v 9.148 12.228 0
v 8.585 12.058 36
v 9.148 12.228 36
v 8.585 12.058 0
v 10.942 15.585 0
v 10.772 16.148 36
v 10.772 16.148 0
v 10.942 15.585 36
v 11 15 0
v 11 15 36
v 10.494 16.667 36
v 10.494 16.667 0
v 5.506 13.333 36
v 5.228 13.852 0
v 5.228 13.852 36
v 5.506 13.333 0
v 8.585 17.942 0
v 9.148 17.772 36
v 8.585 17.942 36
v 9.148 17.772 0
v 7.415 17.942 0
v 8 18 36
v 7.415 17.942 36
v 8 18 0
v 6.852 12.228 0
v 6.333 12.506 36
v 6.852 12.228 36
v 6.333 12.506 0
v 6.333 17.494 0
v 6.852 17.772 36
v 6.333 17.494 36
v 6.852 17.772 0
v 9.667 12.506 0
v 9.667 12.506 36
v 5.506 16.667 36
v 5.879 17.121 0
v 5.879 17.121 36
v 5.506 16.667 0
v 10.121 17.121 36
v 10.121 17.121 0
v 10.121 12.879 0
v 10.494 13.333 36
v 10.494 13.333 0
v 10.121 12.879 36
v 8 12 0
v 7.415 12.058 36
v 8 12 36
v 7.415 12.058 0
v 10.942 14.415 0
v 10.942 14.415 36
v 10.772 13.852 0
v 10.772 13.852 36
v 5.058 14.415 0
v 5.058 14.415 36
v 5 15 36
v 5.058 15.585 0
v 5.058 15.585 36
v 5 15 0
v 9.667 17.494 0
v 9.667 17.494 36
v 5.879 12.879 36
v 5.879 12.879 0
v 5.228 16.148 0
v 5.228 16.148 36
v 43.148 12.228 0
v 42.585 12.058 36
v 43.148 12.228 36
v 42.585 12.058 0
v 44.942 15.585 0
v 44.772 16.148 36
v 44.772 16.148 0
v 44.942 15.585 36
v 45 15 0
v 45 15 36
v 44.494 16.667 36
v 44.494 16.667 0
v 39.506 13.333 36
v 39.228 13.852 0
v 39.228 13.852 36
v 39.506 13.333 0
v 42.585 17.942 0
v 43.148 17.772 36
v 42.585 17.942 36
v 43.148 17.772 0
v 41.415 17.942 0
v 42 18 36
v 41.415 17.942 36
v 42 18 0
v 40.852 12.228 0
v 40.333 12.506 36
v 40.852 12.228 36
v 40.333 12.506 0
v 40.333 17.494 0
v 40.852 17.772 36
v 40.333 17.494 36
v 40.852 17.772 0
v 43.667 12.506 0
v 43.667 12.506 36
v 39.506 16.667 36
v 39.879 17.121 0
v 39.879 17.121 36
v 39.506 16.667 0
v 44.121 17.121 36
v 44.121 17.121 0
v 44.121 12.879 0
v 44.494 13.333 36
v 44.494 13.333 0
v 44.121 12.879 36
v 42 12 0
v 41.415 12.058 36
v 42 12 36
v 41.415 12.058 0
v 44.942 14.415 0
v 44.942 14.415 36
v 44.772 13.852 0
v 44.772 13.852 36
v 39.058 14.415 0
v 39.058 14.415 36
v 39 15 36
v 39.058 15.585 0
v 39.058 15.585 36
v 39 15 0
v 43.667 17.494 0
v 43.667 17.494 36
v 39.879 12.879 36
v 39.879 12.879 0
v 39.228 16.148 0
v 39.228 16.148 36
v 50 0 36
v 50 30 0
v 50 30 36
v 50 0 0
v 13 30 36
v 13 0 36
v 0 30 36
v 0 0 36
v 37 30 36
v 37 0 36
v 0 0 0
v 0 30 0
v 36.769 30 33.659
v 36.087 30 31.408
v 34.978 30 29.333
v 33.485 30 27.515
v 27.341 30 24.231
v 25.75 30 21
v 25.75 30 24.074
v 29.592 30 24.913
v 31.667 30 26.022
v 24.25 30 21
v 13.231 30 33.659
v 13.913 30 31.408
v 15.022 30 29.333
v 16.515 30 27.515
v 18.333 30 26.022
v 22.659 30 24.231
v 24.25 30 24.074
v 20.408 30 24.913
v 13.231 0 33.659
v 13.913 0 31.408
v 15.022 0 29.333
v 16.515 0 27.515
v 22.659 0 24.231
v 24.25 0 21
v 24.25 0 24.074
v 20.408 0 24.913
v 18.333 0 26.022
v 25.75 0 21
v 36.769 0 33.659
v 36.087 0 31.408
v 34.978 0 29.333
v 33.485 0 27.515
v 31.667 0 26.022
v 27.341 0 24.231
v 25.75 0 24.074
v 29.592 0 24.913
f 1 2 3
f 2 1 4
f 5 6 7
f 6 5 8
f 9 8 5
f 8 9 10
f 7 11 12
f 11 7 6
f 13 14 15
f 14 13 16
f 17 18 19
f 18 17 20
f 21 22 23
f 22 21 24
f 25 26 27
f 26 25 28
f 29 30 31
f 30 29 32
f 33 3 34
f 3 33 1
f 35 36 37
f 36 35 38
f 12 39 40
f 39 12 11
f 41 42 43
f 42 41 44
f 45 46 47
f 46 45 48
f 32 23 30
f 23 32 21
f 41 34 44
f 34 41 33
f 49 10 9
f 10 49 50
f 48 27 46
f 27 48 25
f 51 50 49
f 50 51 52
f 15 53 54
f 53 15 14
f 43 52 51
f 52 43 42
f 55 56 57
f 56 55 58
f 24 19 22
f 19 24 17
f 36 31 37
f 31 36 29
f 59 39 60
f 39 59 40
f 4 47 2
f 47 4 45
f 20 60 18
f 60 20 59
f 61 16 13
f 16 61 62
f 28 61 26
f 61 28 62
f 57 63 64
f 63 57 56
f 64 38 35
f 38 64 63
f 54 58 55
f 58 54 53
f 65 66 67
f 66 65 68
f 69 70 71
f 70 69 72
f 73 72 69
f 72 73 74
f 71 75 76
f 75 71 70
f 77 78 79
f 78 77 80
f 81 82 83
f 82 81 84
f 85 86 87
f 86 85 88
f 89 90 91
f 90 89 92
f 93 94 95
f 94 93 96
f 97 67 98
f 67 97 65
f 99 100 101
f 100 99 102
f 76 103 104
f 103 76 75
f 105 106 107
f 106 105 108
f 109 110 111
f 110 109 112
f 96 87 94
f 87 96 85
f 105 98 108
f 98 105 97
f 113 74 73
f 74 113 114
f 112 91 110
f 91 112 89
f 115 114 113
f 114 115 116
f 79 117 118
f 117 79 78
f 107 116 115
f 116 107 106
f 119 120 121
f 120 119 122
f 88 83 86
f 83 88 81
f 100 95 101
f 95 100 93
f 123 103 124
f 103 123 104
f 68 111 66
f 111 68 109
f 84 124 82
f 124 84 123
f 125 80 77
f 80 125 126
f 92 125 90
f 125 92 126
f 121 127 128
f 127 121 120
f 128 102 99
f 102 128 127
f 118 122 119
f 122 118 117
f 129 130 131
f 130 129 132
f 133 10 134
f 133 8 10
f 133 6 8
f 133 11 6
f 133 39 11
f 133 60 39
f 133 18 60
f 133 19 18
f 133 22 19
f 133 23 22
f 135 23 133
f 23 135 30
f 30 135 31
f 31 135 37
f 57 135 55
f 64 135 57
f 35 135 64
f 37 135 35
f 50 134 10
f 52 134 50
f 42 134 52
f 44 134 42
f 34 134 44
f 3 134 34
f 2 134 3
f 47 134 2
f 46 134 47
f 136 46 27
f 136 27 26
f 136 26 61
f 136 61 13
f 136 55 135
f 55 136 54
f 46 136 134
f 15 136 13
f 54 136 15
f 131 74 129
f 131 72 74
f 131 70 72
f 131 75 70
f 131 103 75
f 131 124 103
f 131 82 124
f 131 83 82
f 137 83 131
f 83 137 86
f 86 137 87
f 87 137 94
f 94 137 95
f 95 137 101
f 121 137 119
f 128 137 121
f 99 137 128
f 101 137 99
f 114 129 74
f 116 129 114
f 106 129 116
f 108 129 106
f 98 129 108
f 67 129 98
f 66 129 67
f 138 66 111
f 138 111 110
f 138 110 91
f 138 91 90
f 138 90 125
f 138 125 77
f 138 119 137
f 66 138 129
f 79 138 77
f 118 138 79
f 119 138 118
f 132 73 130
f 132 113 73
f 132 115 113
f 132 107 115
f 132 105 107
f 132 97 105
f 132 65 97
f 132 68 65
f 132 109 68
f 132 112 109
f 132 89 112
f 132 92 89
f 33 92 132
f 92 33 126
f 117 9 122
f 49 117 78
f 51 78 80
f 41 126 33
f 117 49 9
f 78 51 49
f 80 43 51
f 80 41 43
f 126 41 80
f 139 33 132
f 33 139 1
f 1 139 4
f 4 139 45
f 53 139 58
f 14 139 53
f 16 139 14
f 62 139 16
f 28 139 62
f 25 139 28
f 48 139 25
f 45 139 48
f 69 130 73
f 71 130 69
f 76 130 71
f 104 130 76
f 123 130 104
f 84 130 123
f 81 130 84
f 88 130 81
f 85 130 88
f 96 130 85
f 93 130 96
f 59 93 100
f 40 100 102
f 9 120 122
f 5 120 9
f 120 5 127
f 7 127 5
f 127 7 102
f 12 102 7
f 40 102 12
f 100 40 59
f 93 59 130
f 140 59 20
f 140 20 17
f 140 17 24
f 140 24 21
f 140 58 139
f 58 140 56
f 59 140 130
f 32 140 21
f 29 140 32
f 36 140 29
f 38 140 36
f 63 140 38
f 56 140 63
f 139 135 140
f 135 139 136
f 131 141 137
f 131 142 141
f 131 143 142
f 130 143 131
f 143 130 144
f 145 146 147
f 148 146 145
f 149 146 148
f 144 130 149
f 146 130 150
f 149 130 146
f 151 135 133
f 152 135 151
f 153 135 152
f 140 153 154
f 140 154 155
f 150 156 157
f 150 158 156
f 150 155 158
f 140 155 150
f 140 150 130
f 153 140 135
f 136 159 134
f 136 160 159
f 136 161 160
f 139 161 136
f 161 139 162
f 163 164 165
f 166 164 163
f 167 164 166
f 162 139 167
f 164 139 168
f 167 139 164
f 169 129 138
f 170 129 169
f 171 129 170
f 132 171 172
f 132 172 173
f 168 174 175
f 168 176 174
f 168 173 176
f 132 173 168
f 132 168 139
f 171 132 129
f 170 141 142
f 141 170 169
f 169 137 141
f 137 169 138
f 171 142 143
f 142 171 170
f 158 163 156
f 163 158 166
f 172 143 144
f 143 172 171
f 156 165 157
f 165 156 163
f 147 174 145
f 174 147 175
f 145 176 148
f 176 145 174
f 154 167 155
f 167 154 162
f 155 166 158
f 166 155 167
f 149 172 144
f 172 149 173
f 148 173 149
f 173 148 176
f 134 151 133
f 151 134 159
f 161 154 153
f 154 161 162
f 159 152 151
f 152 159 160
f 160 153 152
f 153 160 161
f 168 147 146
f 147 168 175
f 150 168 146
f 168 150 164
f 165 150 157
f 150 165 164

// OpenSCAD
$fn = 32;

// ----------------------------------------------------------------------
// Saddle clamp: split shaft clamp
// ----------------------------------------------------------------------

// --- parameters (mm) ---
blk_l = 50;               // block length, X
blk_w = 30;               // block width, Y
blk_h = 36;               // block height
clamp_r = 12;             // shaft groove radius
hole_r = 3;               // bolt hole radius
hole_m = 8;               // bolt hole margin from the ends
saw_w = 1.5;              // saw kerf width

saw_depth = clamp_r + 3;  // saw kerf depth

difference() {
  cube([blk_l, blk_w, blk_h]);
  translate([blk_l / 2, -1, blk_h])
    rotate([-90, 0, 0])
      cylinder(h = blk_w + 2, r = clamp_r);
  for (sx = [0, 1])
    translate([sx ? blk_l - hole_m : hole_m, blk_w / 2, -1])
      cylinder(r = hole_r, h = blk_h + 2);
  translate([blk_l / 2 - saw_w / 2, -1, blk_h - saw_depth])
    cube([saw_w, blk_w + 2, saw_depth + 1]);
}
